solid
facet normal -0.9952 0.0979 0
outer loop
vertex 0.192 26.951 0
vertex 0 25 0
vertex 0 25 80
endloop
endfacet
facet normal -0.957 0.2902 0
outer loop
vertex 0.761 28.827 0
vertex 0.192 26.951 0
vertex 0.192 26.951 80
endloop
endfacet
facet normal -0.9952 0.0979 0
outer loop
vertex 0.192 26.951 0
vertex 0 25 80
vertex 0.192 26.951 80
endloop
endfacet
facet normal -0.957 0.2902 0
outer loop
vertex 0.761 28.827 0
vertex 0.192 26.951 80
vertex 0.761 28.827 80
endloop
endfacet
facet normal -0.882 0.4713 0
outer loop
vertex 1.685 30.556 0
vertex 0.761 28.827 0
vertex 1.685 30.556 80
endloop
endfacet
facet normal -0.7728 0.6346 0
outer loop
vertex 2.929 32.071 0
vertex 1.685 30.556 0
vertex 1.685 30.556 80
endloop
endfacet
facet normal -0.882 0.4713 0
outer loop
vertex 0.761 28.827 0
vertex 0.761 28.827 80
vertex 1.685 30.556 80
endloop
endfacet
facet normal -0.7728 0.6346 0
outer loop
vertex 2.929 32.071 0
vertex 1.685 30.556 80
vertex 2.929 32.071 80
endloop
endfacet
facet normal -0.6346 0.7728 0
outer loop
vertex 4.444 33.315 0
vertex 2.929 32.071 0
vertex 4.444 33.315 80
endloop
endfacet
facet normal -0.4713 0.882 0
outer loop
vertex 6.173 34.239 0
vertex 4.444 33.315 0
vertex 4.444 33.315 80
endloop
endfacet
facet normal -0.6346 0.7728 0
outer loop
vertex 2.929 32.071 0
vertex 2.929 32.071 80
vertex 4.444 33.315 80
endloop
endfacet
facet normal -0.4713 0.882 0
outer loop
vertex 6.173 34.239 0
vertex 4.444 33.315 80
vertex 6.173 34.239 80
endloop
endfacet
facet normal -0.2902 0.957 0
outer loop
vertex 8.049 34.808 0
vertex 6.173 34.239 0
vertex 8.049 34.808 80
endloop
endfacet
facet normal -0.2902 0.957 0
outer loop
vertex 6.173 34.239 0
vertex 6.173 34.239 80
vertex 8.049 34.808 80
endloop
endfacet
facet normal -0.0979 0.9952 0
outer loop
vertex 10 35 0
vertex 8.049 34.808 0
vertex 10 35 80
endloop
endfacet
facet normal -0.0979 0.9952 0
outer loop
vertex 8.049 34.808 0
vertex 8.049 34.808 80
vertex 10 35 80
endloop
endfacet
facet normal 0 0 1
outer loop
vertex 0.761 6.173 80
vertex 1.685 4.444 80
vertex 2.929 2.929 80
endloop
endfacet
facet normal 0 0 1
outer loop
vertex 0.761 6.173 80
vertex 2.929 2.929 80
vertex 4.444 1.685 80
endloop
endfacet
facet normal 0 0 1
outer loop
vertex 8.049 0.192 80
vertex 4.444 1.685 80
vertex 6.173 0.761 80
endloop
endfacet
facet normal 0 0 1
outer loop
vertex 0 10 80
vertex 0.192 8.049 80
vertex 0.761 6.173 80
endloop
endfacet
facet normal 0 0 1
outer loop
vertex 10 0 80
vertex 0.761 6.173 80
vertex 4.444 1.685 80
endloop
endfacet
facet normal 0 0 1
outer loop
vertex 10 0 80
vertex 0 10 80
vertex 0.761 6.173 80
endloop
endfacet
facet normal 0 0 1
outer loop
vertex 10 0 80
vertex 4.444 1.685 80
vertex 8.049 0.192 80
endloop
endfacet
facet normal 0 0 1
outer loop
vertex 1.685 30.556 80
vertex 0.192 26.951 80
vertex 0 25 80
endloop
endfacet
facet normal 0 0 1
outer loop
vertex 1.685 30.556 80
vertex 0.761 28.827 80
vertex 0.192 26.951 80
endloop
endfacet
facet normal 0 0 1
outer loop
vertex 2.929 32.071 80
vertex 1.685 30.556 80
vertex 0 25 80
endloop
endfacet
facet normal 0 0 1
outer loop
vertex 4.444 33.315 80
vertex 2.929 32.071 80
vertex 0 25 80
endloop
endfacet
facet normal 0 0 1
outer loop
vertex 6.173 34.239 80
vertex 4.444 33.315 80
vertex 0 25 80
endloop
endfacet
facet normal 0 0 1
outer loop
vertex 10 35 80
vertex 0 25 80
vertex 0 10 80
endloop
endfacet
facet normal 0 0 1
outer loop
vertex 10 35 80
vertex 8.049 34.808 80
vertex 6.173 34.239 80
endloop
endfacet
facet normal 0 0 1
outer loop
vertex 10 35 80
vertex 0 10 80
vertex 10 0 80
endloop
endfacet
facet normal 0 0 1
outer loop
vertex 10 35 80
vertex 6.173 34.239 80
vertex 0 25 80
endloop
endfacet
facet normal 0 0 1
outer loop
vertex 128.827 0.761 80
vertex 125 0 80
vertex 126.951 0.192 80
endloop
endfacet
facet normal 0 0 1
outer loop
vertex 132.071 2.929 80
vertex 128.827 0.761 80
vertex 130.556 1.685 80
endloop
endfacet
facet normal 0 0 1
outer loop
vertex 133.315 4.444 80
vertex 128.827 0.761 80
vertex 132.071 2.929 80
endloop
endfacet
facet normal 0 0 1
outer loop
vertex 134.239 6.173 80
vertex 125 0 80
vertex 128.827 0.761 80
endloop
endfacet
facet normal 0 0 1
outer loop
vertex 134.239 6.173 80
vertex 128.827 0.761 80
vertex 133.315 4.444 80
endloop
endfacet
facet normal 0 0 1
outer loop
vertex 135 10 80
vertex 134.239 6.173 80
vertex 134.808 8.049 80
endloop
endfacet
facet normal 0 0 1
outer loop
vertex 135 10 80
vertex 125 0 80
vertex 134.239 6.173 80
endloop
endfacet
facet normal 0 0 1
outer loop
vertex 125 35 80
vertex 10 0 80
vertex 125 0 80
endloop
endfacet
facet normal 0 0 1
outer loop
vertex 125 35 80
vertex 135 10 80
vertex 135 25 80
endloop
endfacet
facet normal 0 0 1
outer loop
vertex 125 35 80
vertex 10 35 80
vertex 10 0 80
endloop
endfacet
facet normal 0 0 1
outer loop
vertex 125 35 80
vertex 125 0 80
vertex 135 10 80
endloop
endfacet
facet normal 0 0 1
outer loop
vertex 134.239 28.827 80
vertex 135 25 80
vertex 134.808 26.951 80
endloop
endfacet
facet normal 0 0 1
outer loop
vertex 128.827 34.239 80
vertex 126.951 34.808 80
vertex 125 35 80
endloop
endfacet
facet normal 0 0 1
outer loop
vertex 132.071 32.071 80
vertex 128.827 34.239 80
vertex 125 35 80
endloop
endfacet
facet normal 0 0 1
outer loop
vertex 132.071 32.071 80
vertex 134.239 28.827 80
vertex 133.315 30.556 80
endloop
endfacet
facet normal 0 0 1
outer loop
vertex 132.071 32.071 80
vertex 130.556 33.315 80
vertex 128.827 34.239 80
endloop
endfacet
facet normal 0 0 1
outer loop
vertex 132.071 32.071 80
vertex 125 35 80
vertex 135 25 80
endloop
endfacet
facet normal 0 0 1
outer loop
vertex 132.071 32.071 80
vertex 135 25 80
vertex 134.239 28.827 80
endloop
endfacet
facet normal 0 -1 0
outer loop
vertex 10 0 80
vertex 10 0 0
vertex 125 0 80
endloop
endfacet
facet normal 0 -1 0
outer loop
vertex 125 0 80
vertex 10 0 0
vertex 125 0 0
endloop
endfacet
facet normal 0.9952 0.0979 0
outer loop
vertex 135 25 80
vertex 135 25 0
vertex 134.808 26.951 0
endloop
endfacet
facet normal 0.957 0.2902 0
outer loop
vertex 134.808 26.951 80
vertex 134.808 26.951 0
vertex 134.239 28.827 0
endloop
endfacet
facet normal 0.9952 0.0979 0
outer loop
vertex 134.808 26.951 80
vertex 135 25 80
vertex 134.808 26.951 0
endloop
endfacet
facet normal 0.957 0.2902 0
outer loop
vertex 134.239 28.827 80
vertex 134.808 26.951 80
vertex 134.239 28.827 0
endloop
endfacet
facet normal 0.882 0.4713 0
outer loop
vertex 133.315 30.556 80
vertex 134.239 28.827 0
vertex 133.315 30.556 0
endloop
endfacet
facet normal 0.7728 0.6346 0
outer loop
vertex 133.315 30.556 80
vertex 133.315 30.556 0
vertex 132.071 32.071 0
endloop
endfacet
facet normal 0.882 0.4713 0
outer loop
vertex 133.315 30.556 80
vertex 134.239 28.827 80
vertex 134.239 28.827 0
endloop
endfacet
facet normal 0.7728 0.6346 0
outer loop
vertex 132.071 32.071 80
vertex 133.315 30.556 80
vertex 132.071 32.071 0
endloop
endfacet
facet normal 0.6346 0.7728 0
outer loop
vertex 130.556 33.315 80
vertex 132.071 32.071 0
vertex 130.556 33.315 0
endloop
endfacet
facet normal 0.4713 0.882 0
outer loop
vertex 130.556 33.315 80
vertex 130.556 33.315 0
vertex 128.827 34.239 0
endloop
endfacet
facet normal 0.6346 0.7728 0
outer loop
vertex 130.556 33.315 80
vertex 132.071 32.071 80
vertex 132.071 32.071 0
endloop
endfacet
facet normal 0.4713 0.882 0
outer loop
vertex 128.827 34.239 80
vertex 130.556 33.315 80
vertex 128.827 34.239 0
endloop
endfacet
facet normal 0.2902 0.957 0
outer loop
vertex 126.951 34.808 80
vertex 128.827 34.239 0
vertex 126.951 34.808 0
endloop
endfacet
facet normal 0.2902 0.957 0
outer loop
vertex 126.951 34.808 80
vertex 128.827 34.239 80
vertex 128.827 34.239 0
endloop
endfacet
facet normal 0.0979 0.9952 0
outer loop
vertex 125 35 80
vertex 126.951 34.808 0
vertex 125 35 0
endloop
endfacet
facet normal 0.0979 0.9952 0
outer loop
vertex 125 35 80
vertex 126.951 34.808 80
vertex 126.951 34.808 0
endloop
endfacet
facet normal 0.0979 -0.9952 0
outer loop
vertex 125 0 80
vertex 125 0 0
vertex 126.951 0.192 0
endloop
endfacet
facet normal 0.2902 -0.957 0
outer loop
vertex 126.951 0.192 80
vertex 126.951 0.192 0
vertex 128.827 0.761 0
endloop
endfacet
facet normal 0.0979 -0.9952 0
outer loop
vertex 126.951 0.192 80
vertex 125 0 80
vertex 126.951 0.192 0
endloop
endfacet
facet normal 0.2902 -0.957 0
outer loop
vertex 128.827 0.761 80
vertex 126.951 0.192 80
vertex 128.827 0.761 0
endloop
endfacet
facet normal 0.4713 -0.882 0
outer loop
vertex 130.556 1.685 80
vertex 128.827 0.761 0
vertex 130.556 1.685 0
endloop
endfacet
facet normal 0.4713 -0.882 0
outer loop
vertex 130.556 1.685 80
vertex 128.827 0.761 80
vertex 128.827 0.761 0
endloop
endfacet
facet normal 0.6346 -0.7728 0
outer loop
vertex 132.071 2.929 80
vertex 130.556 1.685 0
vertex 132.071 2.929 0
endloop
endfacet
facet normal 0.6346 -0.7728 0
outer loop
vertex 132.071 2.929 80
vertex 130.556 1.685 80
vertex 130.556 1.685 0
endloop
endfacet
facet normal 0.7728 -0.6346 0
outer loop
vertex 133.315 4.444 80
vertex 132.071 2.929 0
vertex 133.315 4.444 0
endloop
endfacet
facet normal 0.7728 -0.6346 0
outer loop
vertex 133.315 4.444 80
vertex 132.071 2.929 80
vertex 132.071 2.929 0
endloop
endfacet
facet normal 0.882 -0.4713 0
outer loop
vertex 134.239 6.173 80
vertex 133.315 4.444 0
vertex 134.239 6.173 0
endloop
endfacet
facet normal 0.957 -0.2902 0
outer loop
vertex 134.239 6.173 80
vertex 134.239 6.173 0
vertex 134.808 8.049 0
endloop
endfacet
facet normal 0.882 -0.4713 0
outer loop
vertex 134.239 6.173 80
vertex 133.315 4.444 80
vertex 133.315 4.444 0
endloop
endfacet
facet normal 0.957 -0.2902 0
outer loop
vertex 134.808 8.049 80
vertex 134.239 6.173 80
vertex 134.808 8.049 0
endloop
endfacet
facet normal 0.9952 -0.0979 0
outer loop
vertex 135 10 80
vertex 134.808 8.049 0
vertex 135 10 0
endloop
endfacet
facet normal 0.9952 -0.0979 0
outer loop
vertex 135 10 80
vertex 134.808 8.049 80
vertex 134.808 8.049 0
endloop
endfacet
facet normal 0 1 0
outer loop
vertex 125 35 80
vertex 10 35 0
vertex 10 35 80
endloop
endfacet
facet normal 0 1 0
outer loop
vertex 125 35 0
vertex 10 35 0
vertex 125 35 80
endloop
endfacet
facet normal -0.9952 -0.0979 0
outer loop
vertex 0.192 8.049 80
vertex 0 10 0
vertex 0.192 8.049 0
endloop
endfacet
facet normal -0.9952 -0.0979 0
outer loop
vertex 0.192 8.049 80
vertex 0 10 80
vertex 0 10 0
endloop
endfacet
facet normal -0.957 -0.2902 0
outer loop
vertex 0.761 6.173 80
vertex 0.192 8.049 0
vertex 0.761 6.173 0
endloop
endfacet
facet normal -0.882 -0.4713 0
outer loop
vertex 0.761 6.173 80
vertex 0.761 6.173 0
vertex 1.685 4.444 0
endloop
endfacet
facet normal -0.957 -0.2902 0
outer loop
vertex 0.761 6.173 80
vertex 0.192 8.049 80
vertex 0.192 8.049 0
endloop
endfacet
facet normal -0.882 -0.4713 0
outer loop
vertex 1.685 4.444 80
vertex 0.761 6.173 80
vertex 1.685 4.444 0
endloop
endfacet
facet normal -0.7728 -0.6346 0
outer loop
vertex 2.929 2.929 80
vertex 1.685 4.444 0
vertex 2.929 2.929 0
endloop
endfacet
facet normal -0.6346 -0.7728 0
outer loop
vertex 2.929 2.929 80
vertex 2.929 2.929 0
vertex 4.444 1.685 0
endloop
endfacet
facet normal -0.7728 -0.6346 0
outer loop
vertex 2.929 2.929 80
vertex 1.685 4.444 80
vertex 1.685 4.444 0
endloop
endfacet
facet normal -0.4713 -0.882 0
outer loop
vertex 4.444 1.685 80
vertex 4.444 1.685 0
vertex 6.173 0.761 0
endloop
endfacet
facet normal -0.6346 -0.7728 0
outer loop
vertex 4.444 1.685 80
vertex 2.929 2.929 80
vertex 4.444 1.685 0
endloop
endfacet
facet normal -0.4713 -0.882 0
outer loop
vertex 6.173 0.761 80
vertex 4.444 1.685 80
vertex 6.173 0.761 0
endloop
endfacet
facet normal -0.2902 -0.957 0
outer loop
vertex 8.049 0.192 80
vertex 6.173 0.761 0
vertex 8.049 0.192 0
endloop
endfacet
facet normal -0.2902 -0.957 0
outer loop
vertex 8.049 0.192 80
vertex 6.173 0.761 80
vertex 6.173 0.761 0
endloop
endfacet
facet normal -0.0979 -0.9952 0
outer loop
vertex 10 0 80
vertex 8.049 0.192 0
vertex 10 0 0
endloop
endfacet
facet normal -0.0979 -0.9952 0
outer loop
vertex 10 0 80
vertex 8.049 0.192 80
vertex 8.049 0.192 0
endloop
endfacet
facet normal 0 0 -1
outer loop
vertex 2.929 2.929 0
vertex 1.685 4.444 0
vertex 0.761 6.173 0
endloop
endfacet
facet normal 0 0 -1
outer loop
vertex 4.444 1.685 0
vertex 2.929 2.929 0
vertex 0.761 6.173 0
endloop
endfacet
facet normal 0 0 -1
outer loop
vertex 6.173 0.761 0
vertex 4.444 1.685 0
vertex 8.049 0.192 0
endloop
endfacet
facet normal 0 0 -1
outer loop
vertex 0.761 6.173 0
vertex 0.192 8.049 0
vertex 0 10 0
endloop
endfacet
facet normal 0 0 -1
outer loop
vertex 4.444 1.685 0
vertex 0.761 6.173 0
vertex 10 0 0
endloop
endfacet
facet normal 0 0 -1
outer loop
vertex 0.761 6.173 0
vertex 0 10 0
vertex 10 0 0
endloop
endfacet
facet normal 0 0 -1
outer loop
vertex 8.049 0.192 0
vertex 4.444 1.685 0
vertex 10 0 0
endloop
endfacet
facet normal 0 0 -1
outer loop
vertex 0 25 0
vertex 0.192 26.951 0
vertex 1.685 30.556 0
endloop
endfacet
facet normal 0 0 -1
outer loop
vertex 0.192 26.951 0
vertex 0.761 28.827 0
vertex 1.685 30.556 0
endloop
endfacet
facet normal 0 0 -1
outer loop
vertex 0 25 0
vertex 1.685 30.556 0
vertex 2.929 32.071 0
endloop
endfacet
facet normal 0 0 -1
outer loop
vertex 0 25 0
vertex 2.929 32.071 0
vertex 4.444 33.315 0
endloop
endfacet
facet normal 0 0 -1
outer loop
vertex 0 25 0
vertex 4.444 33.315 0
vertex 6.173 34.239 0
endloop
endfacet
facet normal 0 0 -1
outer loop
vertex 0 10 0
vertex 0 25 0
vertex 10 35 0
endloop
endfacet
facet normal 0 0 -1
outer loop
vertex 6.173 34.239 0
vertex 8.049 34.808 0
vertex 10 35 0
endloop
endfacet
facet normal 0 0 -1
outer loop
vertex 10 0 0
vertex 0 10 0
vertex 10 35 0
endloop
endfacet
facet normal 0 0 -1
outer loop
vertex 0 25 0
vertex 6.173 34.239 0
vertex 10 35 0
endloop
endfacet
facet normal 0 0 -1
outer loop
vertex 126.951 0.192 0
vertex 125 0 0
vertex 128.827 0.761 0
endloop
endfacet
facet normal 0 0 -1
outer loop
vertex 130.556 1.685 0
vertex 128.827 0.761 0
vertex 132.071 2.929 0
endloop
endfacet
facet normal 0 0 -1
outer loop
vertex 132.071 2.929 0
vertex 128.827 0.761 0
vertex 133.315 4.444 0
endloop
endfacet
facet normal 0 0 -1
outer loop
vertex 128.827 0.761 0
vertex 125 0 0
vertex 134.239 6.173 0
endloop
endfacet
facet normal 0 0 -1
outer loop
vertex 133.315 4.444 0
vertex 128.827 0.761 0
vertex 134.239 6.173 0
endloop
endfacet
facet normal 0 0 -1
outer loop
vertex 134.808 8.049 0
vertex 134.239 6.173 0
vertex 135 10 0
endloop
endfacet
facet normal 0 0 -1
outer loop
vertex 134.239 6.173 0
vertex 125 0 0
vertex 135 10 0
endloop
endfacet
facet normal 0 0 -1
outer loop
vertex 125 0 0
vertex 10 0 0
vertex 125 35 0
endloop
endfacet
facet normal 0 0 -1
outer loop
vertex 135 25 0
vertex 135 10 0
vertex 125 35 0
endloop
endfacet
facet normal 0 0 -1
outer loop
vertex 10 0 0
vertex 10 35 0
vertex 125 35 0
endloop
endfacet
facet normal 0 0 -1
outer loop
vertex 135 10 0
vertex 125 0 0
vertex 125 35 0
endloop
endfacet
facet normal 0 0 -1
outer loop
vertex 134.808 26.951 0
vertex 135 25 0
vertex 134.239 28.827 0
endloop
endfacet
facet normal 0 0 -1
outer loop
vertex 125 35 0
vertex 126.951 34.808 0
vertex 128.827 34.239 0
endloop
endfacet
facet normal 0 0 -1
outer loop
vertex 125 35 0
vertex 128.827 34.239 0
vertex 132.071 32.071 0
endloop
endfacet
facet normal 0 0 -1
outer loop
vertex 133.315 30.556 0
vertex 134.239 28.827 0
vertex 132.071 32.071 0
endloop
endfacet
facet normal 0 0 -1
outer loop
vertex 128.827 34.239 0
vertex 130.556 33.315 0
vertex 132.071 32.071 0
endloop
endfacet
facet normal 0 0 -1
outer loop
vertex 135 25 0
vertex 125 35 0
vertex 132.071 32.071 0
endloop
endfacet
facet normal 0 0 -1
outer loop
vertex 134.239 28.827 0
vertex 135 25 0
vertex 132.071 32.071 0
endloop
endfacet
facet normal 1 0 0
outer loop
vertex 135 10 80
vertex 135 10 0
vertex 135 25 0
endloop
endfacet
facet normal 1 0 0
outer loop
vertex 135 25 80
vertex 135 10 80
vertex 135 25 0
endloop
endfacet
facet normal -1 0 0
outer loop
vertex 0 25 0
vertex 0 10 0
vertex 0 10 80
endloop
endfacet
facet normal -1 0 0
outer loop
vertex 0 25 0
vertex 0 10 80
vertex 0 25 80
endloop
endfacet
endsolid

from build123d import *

# Parameters (mm, degrees)
SKETCH_1_W      = 135
SKETCH_1_H      = 35
EXTRUDE_1_DEPTH = 80
FILLET_1_R      = 10


with BuildPart() as part:
    # 草图1 → 凸台-拉伸1 (new body)
    with BuildSketch(Plane.XY):
        with Locations((67.5, 17.5)):
            Rectangle(SKETCH_1_W, SKETCH_1_H)
    extrude(amount=EXTRUDE_1_DEPTH)

    # 圆角1
    fillet_1_edges = [part.edges().sort_by_distance(p)[0] for p in [
        (0, 35, 40),
        (135, 35, 40),
        (135, 0, 40),
        (0, 0, 40),
    ]]
    fillet(fillet_1_edges, radius=FILLET_1_R)


solid = part.part
